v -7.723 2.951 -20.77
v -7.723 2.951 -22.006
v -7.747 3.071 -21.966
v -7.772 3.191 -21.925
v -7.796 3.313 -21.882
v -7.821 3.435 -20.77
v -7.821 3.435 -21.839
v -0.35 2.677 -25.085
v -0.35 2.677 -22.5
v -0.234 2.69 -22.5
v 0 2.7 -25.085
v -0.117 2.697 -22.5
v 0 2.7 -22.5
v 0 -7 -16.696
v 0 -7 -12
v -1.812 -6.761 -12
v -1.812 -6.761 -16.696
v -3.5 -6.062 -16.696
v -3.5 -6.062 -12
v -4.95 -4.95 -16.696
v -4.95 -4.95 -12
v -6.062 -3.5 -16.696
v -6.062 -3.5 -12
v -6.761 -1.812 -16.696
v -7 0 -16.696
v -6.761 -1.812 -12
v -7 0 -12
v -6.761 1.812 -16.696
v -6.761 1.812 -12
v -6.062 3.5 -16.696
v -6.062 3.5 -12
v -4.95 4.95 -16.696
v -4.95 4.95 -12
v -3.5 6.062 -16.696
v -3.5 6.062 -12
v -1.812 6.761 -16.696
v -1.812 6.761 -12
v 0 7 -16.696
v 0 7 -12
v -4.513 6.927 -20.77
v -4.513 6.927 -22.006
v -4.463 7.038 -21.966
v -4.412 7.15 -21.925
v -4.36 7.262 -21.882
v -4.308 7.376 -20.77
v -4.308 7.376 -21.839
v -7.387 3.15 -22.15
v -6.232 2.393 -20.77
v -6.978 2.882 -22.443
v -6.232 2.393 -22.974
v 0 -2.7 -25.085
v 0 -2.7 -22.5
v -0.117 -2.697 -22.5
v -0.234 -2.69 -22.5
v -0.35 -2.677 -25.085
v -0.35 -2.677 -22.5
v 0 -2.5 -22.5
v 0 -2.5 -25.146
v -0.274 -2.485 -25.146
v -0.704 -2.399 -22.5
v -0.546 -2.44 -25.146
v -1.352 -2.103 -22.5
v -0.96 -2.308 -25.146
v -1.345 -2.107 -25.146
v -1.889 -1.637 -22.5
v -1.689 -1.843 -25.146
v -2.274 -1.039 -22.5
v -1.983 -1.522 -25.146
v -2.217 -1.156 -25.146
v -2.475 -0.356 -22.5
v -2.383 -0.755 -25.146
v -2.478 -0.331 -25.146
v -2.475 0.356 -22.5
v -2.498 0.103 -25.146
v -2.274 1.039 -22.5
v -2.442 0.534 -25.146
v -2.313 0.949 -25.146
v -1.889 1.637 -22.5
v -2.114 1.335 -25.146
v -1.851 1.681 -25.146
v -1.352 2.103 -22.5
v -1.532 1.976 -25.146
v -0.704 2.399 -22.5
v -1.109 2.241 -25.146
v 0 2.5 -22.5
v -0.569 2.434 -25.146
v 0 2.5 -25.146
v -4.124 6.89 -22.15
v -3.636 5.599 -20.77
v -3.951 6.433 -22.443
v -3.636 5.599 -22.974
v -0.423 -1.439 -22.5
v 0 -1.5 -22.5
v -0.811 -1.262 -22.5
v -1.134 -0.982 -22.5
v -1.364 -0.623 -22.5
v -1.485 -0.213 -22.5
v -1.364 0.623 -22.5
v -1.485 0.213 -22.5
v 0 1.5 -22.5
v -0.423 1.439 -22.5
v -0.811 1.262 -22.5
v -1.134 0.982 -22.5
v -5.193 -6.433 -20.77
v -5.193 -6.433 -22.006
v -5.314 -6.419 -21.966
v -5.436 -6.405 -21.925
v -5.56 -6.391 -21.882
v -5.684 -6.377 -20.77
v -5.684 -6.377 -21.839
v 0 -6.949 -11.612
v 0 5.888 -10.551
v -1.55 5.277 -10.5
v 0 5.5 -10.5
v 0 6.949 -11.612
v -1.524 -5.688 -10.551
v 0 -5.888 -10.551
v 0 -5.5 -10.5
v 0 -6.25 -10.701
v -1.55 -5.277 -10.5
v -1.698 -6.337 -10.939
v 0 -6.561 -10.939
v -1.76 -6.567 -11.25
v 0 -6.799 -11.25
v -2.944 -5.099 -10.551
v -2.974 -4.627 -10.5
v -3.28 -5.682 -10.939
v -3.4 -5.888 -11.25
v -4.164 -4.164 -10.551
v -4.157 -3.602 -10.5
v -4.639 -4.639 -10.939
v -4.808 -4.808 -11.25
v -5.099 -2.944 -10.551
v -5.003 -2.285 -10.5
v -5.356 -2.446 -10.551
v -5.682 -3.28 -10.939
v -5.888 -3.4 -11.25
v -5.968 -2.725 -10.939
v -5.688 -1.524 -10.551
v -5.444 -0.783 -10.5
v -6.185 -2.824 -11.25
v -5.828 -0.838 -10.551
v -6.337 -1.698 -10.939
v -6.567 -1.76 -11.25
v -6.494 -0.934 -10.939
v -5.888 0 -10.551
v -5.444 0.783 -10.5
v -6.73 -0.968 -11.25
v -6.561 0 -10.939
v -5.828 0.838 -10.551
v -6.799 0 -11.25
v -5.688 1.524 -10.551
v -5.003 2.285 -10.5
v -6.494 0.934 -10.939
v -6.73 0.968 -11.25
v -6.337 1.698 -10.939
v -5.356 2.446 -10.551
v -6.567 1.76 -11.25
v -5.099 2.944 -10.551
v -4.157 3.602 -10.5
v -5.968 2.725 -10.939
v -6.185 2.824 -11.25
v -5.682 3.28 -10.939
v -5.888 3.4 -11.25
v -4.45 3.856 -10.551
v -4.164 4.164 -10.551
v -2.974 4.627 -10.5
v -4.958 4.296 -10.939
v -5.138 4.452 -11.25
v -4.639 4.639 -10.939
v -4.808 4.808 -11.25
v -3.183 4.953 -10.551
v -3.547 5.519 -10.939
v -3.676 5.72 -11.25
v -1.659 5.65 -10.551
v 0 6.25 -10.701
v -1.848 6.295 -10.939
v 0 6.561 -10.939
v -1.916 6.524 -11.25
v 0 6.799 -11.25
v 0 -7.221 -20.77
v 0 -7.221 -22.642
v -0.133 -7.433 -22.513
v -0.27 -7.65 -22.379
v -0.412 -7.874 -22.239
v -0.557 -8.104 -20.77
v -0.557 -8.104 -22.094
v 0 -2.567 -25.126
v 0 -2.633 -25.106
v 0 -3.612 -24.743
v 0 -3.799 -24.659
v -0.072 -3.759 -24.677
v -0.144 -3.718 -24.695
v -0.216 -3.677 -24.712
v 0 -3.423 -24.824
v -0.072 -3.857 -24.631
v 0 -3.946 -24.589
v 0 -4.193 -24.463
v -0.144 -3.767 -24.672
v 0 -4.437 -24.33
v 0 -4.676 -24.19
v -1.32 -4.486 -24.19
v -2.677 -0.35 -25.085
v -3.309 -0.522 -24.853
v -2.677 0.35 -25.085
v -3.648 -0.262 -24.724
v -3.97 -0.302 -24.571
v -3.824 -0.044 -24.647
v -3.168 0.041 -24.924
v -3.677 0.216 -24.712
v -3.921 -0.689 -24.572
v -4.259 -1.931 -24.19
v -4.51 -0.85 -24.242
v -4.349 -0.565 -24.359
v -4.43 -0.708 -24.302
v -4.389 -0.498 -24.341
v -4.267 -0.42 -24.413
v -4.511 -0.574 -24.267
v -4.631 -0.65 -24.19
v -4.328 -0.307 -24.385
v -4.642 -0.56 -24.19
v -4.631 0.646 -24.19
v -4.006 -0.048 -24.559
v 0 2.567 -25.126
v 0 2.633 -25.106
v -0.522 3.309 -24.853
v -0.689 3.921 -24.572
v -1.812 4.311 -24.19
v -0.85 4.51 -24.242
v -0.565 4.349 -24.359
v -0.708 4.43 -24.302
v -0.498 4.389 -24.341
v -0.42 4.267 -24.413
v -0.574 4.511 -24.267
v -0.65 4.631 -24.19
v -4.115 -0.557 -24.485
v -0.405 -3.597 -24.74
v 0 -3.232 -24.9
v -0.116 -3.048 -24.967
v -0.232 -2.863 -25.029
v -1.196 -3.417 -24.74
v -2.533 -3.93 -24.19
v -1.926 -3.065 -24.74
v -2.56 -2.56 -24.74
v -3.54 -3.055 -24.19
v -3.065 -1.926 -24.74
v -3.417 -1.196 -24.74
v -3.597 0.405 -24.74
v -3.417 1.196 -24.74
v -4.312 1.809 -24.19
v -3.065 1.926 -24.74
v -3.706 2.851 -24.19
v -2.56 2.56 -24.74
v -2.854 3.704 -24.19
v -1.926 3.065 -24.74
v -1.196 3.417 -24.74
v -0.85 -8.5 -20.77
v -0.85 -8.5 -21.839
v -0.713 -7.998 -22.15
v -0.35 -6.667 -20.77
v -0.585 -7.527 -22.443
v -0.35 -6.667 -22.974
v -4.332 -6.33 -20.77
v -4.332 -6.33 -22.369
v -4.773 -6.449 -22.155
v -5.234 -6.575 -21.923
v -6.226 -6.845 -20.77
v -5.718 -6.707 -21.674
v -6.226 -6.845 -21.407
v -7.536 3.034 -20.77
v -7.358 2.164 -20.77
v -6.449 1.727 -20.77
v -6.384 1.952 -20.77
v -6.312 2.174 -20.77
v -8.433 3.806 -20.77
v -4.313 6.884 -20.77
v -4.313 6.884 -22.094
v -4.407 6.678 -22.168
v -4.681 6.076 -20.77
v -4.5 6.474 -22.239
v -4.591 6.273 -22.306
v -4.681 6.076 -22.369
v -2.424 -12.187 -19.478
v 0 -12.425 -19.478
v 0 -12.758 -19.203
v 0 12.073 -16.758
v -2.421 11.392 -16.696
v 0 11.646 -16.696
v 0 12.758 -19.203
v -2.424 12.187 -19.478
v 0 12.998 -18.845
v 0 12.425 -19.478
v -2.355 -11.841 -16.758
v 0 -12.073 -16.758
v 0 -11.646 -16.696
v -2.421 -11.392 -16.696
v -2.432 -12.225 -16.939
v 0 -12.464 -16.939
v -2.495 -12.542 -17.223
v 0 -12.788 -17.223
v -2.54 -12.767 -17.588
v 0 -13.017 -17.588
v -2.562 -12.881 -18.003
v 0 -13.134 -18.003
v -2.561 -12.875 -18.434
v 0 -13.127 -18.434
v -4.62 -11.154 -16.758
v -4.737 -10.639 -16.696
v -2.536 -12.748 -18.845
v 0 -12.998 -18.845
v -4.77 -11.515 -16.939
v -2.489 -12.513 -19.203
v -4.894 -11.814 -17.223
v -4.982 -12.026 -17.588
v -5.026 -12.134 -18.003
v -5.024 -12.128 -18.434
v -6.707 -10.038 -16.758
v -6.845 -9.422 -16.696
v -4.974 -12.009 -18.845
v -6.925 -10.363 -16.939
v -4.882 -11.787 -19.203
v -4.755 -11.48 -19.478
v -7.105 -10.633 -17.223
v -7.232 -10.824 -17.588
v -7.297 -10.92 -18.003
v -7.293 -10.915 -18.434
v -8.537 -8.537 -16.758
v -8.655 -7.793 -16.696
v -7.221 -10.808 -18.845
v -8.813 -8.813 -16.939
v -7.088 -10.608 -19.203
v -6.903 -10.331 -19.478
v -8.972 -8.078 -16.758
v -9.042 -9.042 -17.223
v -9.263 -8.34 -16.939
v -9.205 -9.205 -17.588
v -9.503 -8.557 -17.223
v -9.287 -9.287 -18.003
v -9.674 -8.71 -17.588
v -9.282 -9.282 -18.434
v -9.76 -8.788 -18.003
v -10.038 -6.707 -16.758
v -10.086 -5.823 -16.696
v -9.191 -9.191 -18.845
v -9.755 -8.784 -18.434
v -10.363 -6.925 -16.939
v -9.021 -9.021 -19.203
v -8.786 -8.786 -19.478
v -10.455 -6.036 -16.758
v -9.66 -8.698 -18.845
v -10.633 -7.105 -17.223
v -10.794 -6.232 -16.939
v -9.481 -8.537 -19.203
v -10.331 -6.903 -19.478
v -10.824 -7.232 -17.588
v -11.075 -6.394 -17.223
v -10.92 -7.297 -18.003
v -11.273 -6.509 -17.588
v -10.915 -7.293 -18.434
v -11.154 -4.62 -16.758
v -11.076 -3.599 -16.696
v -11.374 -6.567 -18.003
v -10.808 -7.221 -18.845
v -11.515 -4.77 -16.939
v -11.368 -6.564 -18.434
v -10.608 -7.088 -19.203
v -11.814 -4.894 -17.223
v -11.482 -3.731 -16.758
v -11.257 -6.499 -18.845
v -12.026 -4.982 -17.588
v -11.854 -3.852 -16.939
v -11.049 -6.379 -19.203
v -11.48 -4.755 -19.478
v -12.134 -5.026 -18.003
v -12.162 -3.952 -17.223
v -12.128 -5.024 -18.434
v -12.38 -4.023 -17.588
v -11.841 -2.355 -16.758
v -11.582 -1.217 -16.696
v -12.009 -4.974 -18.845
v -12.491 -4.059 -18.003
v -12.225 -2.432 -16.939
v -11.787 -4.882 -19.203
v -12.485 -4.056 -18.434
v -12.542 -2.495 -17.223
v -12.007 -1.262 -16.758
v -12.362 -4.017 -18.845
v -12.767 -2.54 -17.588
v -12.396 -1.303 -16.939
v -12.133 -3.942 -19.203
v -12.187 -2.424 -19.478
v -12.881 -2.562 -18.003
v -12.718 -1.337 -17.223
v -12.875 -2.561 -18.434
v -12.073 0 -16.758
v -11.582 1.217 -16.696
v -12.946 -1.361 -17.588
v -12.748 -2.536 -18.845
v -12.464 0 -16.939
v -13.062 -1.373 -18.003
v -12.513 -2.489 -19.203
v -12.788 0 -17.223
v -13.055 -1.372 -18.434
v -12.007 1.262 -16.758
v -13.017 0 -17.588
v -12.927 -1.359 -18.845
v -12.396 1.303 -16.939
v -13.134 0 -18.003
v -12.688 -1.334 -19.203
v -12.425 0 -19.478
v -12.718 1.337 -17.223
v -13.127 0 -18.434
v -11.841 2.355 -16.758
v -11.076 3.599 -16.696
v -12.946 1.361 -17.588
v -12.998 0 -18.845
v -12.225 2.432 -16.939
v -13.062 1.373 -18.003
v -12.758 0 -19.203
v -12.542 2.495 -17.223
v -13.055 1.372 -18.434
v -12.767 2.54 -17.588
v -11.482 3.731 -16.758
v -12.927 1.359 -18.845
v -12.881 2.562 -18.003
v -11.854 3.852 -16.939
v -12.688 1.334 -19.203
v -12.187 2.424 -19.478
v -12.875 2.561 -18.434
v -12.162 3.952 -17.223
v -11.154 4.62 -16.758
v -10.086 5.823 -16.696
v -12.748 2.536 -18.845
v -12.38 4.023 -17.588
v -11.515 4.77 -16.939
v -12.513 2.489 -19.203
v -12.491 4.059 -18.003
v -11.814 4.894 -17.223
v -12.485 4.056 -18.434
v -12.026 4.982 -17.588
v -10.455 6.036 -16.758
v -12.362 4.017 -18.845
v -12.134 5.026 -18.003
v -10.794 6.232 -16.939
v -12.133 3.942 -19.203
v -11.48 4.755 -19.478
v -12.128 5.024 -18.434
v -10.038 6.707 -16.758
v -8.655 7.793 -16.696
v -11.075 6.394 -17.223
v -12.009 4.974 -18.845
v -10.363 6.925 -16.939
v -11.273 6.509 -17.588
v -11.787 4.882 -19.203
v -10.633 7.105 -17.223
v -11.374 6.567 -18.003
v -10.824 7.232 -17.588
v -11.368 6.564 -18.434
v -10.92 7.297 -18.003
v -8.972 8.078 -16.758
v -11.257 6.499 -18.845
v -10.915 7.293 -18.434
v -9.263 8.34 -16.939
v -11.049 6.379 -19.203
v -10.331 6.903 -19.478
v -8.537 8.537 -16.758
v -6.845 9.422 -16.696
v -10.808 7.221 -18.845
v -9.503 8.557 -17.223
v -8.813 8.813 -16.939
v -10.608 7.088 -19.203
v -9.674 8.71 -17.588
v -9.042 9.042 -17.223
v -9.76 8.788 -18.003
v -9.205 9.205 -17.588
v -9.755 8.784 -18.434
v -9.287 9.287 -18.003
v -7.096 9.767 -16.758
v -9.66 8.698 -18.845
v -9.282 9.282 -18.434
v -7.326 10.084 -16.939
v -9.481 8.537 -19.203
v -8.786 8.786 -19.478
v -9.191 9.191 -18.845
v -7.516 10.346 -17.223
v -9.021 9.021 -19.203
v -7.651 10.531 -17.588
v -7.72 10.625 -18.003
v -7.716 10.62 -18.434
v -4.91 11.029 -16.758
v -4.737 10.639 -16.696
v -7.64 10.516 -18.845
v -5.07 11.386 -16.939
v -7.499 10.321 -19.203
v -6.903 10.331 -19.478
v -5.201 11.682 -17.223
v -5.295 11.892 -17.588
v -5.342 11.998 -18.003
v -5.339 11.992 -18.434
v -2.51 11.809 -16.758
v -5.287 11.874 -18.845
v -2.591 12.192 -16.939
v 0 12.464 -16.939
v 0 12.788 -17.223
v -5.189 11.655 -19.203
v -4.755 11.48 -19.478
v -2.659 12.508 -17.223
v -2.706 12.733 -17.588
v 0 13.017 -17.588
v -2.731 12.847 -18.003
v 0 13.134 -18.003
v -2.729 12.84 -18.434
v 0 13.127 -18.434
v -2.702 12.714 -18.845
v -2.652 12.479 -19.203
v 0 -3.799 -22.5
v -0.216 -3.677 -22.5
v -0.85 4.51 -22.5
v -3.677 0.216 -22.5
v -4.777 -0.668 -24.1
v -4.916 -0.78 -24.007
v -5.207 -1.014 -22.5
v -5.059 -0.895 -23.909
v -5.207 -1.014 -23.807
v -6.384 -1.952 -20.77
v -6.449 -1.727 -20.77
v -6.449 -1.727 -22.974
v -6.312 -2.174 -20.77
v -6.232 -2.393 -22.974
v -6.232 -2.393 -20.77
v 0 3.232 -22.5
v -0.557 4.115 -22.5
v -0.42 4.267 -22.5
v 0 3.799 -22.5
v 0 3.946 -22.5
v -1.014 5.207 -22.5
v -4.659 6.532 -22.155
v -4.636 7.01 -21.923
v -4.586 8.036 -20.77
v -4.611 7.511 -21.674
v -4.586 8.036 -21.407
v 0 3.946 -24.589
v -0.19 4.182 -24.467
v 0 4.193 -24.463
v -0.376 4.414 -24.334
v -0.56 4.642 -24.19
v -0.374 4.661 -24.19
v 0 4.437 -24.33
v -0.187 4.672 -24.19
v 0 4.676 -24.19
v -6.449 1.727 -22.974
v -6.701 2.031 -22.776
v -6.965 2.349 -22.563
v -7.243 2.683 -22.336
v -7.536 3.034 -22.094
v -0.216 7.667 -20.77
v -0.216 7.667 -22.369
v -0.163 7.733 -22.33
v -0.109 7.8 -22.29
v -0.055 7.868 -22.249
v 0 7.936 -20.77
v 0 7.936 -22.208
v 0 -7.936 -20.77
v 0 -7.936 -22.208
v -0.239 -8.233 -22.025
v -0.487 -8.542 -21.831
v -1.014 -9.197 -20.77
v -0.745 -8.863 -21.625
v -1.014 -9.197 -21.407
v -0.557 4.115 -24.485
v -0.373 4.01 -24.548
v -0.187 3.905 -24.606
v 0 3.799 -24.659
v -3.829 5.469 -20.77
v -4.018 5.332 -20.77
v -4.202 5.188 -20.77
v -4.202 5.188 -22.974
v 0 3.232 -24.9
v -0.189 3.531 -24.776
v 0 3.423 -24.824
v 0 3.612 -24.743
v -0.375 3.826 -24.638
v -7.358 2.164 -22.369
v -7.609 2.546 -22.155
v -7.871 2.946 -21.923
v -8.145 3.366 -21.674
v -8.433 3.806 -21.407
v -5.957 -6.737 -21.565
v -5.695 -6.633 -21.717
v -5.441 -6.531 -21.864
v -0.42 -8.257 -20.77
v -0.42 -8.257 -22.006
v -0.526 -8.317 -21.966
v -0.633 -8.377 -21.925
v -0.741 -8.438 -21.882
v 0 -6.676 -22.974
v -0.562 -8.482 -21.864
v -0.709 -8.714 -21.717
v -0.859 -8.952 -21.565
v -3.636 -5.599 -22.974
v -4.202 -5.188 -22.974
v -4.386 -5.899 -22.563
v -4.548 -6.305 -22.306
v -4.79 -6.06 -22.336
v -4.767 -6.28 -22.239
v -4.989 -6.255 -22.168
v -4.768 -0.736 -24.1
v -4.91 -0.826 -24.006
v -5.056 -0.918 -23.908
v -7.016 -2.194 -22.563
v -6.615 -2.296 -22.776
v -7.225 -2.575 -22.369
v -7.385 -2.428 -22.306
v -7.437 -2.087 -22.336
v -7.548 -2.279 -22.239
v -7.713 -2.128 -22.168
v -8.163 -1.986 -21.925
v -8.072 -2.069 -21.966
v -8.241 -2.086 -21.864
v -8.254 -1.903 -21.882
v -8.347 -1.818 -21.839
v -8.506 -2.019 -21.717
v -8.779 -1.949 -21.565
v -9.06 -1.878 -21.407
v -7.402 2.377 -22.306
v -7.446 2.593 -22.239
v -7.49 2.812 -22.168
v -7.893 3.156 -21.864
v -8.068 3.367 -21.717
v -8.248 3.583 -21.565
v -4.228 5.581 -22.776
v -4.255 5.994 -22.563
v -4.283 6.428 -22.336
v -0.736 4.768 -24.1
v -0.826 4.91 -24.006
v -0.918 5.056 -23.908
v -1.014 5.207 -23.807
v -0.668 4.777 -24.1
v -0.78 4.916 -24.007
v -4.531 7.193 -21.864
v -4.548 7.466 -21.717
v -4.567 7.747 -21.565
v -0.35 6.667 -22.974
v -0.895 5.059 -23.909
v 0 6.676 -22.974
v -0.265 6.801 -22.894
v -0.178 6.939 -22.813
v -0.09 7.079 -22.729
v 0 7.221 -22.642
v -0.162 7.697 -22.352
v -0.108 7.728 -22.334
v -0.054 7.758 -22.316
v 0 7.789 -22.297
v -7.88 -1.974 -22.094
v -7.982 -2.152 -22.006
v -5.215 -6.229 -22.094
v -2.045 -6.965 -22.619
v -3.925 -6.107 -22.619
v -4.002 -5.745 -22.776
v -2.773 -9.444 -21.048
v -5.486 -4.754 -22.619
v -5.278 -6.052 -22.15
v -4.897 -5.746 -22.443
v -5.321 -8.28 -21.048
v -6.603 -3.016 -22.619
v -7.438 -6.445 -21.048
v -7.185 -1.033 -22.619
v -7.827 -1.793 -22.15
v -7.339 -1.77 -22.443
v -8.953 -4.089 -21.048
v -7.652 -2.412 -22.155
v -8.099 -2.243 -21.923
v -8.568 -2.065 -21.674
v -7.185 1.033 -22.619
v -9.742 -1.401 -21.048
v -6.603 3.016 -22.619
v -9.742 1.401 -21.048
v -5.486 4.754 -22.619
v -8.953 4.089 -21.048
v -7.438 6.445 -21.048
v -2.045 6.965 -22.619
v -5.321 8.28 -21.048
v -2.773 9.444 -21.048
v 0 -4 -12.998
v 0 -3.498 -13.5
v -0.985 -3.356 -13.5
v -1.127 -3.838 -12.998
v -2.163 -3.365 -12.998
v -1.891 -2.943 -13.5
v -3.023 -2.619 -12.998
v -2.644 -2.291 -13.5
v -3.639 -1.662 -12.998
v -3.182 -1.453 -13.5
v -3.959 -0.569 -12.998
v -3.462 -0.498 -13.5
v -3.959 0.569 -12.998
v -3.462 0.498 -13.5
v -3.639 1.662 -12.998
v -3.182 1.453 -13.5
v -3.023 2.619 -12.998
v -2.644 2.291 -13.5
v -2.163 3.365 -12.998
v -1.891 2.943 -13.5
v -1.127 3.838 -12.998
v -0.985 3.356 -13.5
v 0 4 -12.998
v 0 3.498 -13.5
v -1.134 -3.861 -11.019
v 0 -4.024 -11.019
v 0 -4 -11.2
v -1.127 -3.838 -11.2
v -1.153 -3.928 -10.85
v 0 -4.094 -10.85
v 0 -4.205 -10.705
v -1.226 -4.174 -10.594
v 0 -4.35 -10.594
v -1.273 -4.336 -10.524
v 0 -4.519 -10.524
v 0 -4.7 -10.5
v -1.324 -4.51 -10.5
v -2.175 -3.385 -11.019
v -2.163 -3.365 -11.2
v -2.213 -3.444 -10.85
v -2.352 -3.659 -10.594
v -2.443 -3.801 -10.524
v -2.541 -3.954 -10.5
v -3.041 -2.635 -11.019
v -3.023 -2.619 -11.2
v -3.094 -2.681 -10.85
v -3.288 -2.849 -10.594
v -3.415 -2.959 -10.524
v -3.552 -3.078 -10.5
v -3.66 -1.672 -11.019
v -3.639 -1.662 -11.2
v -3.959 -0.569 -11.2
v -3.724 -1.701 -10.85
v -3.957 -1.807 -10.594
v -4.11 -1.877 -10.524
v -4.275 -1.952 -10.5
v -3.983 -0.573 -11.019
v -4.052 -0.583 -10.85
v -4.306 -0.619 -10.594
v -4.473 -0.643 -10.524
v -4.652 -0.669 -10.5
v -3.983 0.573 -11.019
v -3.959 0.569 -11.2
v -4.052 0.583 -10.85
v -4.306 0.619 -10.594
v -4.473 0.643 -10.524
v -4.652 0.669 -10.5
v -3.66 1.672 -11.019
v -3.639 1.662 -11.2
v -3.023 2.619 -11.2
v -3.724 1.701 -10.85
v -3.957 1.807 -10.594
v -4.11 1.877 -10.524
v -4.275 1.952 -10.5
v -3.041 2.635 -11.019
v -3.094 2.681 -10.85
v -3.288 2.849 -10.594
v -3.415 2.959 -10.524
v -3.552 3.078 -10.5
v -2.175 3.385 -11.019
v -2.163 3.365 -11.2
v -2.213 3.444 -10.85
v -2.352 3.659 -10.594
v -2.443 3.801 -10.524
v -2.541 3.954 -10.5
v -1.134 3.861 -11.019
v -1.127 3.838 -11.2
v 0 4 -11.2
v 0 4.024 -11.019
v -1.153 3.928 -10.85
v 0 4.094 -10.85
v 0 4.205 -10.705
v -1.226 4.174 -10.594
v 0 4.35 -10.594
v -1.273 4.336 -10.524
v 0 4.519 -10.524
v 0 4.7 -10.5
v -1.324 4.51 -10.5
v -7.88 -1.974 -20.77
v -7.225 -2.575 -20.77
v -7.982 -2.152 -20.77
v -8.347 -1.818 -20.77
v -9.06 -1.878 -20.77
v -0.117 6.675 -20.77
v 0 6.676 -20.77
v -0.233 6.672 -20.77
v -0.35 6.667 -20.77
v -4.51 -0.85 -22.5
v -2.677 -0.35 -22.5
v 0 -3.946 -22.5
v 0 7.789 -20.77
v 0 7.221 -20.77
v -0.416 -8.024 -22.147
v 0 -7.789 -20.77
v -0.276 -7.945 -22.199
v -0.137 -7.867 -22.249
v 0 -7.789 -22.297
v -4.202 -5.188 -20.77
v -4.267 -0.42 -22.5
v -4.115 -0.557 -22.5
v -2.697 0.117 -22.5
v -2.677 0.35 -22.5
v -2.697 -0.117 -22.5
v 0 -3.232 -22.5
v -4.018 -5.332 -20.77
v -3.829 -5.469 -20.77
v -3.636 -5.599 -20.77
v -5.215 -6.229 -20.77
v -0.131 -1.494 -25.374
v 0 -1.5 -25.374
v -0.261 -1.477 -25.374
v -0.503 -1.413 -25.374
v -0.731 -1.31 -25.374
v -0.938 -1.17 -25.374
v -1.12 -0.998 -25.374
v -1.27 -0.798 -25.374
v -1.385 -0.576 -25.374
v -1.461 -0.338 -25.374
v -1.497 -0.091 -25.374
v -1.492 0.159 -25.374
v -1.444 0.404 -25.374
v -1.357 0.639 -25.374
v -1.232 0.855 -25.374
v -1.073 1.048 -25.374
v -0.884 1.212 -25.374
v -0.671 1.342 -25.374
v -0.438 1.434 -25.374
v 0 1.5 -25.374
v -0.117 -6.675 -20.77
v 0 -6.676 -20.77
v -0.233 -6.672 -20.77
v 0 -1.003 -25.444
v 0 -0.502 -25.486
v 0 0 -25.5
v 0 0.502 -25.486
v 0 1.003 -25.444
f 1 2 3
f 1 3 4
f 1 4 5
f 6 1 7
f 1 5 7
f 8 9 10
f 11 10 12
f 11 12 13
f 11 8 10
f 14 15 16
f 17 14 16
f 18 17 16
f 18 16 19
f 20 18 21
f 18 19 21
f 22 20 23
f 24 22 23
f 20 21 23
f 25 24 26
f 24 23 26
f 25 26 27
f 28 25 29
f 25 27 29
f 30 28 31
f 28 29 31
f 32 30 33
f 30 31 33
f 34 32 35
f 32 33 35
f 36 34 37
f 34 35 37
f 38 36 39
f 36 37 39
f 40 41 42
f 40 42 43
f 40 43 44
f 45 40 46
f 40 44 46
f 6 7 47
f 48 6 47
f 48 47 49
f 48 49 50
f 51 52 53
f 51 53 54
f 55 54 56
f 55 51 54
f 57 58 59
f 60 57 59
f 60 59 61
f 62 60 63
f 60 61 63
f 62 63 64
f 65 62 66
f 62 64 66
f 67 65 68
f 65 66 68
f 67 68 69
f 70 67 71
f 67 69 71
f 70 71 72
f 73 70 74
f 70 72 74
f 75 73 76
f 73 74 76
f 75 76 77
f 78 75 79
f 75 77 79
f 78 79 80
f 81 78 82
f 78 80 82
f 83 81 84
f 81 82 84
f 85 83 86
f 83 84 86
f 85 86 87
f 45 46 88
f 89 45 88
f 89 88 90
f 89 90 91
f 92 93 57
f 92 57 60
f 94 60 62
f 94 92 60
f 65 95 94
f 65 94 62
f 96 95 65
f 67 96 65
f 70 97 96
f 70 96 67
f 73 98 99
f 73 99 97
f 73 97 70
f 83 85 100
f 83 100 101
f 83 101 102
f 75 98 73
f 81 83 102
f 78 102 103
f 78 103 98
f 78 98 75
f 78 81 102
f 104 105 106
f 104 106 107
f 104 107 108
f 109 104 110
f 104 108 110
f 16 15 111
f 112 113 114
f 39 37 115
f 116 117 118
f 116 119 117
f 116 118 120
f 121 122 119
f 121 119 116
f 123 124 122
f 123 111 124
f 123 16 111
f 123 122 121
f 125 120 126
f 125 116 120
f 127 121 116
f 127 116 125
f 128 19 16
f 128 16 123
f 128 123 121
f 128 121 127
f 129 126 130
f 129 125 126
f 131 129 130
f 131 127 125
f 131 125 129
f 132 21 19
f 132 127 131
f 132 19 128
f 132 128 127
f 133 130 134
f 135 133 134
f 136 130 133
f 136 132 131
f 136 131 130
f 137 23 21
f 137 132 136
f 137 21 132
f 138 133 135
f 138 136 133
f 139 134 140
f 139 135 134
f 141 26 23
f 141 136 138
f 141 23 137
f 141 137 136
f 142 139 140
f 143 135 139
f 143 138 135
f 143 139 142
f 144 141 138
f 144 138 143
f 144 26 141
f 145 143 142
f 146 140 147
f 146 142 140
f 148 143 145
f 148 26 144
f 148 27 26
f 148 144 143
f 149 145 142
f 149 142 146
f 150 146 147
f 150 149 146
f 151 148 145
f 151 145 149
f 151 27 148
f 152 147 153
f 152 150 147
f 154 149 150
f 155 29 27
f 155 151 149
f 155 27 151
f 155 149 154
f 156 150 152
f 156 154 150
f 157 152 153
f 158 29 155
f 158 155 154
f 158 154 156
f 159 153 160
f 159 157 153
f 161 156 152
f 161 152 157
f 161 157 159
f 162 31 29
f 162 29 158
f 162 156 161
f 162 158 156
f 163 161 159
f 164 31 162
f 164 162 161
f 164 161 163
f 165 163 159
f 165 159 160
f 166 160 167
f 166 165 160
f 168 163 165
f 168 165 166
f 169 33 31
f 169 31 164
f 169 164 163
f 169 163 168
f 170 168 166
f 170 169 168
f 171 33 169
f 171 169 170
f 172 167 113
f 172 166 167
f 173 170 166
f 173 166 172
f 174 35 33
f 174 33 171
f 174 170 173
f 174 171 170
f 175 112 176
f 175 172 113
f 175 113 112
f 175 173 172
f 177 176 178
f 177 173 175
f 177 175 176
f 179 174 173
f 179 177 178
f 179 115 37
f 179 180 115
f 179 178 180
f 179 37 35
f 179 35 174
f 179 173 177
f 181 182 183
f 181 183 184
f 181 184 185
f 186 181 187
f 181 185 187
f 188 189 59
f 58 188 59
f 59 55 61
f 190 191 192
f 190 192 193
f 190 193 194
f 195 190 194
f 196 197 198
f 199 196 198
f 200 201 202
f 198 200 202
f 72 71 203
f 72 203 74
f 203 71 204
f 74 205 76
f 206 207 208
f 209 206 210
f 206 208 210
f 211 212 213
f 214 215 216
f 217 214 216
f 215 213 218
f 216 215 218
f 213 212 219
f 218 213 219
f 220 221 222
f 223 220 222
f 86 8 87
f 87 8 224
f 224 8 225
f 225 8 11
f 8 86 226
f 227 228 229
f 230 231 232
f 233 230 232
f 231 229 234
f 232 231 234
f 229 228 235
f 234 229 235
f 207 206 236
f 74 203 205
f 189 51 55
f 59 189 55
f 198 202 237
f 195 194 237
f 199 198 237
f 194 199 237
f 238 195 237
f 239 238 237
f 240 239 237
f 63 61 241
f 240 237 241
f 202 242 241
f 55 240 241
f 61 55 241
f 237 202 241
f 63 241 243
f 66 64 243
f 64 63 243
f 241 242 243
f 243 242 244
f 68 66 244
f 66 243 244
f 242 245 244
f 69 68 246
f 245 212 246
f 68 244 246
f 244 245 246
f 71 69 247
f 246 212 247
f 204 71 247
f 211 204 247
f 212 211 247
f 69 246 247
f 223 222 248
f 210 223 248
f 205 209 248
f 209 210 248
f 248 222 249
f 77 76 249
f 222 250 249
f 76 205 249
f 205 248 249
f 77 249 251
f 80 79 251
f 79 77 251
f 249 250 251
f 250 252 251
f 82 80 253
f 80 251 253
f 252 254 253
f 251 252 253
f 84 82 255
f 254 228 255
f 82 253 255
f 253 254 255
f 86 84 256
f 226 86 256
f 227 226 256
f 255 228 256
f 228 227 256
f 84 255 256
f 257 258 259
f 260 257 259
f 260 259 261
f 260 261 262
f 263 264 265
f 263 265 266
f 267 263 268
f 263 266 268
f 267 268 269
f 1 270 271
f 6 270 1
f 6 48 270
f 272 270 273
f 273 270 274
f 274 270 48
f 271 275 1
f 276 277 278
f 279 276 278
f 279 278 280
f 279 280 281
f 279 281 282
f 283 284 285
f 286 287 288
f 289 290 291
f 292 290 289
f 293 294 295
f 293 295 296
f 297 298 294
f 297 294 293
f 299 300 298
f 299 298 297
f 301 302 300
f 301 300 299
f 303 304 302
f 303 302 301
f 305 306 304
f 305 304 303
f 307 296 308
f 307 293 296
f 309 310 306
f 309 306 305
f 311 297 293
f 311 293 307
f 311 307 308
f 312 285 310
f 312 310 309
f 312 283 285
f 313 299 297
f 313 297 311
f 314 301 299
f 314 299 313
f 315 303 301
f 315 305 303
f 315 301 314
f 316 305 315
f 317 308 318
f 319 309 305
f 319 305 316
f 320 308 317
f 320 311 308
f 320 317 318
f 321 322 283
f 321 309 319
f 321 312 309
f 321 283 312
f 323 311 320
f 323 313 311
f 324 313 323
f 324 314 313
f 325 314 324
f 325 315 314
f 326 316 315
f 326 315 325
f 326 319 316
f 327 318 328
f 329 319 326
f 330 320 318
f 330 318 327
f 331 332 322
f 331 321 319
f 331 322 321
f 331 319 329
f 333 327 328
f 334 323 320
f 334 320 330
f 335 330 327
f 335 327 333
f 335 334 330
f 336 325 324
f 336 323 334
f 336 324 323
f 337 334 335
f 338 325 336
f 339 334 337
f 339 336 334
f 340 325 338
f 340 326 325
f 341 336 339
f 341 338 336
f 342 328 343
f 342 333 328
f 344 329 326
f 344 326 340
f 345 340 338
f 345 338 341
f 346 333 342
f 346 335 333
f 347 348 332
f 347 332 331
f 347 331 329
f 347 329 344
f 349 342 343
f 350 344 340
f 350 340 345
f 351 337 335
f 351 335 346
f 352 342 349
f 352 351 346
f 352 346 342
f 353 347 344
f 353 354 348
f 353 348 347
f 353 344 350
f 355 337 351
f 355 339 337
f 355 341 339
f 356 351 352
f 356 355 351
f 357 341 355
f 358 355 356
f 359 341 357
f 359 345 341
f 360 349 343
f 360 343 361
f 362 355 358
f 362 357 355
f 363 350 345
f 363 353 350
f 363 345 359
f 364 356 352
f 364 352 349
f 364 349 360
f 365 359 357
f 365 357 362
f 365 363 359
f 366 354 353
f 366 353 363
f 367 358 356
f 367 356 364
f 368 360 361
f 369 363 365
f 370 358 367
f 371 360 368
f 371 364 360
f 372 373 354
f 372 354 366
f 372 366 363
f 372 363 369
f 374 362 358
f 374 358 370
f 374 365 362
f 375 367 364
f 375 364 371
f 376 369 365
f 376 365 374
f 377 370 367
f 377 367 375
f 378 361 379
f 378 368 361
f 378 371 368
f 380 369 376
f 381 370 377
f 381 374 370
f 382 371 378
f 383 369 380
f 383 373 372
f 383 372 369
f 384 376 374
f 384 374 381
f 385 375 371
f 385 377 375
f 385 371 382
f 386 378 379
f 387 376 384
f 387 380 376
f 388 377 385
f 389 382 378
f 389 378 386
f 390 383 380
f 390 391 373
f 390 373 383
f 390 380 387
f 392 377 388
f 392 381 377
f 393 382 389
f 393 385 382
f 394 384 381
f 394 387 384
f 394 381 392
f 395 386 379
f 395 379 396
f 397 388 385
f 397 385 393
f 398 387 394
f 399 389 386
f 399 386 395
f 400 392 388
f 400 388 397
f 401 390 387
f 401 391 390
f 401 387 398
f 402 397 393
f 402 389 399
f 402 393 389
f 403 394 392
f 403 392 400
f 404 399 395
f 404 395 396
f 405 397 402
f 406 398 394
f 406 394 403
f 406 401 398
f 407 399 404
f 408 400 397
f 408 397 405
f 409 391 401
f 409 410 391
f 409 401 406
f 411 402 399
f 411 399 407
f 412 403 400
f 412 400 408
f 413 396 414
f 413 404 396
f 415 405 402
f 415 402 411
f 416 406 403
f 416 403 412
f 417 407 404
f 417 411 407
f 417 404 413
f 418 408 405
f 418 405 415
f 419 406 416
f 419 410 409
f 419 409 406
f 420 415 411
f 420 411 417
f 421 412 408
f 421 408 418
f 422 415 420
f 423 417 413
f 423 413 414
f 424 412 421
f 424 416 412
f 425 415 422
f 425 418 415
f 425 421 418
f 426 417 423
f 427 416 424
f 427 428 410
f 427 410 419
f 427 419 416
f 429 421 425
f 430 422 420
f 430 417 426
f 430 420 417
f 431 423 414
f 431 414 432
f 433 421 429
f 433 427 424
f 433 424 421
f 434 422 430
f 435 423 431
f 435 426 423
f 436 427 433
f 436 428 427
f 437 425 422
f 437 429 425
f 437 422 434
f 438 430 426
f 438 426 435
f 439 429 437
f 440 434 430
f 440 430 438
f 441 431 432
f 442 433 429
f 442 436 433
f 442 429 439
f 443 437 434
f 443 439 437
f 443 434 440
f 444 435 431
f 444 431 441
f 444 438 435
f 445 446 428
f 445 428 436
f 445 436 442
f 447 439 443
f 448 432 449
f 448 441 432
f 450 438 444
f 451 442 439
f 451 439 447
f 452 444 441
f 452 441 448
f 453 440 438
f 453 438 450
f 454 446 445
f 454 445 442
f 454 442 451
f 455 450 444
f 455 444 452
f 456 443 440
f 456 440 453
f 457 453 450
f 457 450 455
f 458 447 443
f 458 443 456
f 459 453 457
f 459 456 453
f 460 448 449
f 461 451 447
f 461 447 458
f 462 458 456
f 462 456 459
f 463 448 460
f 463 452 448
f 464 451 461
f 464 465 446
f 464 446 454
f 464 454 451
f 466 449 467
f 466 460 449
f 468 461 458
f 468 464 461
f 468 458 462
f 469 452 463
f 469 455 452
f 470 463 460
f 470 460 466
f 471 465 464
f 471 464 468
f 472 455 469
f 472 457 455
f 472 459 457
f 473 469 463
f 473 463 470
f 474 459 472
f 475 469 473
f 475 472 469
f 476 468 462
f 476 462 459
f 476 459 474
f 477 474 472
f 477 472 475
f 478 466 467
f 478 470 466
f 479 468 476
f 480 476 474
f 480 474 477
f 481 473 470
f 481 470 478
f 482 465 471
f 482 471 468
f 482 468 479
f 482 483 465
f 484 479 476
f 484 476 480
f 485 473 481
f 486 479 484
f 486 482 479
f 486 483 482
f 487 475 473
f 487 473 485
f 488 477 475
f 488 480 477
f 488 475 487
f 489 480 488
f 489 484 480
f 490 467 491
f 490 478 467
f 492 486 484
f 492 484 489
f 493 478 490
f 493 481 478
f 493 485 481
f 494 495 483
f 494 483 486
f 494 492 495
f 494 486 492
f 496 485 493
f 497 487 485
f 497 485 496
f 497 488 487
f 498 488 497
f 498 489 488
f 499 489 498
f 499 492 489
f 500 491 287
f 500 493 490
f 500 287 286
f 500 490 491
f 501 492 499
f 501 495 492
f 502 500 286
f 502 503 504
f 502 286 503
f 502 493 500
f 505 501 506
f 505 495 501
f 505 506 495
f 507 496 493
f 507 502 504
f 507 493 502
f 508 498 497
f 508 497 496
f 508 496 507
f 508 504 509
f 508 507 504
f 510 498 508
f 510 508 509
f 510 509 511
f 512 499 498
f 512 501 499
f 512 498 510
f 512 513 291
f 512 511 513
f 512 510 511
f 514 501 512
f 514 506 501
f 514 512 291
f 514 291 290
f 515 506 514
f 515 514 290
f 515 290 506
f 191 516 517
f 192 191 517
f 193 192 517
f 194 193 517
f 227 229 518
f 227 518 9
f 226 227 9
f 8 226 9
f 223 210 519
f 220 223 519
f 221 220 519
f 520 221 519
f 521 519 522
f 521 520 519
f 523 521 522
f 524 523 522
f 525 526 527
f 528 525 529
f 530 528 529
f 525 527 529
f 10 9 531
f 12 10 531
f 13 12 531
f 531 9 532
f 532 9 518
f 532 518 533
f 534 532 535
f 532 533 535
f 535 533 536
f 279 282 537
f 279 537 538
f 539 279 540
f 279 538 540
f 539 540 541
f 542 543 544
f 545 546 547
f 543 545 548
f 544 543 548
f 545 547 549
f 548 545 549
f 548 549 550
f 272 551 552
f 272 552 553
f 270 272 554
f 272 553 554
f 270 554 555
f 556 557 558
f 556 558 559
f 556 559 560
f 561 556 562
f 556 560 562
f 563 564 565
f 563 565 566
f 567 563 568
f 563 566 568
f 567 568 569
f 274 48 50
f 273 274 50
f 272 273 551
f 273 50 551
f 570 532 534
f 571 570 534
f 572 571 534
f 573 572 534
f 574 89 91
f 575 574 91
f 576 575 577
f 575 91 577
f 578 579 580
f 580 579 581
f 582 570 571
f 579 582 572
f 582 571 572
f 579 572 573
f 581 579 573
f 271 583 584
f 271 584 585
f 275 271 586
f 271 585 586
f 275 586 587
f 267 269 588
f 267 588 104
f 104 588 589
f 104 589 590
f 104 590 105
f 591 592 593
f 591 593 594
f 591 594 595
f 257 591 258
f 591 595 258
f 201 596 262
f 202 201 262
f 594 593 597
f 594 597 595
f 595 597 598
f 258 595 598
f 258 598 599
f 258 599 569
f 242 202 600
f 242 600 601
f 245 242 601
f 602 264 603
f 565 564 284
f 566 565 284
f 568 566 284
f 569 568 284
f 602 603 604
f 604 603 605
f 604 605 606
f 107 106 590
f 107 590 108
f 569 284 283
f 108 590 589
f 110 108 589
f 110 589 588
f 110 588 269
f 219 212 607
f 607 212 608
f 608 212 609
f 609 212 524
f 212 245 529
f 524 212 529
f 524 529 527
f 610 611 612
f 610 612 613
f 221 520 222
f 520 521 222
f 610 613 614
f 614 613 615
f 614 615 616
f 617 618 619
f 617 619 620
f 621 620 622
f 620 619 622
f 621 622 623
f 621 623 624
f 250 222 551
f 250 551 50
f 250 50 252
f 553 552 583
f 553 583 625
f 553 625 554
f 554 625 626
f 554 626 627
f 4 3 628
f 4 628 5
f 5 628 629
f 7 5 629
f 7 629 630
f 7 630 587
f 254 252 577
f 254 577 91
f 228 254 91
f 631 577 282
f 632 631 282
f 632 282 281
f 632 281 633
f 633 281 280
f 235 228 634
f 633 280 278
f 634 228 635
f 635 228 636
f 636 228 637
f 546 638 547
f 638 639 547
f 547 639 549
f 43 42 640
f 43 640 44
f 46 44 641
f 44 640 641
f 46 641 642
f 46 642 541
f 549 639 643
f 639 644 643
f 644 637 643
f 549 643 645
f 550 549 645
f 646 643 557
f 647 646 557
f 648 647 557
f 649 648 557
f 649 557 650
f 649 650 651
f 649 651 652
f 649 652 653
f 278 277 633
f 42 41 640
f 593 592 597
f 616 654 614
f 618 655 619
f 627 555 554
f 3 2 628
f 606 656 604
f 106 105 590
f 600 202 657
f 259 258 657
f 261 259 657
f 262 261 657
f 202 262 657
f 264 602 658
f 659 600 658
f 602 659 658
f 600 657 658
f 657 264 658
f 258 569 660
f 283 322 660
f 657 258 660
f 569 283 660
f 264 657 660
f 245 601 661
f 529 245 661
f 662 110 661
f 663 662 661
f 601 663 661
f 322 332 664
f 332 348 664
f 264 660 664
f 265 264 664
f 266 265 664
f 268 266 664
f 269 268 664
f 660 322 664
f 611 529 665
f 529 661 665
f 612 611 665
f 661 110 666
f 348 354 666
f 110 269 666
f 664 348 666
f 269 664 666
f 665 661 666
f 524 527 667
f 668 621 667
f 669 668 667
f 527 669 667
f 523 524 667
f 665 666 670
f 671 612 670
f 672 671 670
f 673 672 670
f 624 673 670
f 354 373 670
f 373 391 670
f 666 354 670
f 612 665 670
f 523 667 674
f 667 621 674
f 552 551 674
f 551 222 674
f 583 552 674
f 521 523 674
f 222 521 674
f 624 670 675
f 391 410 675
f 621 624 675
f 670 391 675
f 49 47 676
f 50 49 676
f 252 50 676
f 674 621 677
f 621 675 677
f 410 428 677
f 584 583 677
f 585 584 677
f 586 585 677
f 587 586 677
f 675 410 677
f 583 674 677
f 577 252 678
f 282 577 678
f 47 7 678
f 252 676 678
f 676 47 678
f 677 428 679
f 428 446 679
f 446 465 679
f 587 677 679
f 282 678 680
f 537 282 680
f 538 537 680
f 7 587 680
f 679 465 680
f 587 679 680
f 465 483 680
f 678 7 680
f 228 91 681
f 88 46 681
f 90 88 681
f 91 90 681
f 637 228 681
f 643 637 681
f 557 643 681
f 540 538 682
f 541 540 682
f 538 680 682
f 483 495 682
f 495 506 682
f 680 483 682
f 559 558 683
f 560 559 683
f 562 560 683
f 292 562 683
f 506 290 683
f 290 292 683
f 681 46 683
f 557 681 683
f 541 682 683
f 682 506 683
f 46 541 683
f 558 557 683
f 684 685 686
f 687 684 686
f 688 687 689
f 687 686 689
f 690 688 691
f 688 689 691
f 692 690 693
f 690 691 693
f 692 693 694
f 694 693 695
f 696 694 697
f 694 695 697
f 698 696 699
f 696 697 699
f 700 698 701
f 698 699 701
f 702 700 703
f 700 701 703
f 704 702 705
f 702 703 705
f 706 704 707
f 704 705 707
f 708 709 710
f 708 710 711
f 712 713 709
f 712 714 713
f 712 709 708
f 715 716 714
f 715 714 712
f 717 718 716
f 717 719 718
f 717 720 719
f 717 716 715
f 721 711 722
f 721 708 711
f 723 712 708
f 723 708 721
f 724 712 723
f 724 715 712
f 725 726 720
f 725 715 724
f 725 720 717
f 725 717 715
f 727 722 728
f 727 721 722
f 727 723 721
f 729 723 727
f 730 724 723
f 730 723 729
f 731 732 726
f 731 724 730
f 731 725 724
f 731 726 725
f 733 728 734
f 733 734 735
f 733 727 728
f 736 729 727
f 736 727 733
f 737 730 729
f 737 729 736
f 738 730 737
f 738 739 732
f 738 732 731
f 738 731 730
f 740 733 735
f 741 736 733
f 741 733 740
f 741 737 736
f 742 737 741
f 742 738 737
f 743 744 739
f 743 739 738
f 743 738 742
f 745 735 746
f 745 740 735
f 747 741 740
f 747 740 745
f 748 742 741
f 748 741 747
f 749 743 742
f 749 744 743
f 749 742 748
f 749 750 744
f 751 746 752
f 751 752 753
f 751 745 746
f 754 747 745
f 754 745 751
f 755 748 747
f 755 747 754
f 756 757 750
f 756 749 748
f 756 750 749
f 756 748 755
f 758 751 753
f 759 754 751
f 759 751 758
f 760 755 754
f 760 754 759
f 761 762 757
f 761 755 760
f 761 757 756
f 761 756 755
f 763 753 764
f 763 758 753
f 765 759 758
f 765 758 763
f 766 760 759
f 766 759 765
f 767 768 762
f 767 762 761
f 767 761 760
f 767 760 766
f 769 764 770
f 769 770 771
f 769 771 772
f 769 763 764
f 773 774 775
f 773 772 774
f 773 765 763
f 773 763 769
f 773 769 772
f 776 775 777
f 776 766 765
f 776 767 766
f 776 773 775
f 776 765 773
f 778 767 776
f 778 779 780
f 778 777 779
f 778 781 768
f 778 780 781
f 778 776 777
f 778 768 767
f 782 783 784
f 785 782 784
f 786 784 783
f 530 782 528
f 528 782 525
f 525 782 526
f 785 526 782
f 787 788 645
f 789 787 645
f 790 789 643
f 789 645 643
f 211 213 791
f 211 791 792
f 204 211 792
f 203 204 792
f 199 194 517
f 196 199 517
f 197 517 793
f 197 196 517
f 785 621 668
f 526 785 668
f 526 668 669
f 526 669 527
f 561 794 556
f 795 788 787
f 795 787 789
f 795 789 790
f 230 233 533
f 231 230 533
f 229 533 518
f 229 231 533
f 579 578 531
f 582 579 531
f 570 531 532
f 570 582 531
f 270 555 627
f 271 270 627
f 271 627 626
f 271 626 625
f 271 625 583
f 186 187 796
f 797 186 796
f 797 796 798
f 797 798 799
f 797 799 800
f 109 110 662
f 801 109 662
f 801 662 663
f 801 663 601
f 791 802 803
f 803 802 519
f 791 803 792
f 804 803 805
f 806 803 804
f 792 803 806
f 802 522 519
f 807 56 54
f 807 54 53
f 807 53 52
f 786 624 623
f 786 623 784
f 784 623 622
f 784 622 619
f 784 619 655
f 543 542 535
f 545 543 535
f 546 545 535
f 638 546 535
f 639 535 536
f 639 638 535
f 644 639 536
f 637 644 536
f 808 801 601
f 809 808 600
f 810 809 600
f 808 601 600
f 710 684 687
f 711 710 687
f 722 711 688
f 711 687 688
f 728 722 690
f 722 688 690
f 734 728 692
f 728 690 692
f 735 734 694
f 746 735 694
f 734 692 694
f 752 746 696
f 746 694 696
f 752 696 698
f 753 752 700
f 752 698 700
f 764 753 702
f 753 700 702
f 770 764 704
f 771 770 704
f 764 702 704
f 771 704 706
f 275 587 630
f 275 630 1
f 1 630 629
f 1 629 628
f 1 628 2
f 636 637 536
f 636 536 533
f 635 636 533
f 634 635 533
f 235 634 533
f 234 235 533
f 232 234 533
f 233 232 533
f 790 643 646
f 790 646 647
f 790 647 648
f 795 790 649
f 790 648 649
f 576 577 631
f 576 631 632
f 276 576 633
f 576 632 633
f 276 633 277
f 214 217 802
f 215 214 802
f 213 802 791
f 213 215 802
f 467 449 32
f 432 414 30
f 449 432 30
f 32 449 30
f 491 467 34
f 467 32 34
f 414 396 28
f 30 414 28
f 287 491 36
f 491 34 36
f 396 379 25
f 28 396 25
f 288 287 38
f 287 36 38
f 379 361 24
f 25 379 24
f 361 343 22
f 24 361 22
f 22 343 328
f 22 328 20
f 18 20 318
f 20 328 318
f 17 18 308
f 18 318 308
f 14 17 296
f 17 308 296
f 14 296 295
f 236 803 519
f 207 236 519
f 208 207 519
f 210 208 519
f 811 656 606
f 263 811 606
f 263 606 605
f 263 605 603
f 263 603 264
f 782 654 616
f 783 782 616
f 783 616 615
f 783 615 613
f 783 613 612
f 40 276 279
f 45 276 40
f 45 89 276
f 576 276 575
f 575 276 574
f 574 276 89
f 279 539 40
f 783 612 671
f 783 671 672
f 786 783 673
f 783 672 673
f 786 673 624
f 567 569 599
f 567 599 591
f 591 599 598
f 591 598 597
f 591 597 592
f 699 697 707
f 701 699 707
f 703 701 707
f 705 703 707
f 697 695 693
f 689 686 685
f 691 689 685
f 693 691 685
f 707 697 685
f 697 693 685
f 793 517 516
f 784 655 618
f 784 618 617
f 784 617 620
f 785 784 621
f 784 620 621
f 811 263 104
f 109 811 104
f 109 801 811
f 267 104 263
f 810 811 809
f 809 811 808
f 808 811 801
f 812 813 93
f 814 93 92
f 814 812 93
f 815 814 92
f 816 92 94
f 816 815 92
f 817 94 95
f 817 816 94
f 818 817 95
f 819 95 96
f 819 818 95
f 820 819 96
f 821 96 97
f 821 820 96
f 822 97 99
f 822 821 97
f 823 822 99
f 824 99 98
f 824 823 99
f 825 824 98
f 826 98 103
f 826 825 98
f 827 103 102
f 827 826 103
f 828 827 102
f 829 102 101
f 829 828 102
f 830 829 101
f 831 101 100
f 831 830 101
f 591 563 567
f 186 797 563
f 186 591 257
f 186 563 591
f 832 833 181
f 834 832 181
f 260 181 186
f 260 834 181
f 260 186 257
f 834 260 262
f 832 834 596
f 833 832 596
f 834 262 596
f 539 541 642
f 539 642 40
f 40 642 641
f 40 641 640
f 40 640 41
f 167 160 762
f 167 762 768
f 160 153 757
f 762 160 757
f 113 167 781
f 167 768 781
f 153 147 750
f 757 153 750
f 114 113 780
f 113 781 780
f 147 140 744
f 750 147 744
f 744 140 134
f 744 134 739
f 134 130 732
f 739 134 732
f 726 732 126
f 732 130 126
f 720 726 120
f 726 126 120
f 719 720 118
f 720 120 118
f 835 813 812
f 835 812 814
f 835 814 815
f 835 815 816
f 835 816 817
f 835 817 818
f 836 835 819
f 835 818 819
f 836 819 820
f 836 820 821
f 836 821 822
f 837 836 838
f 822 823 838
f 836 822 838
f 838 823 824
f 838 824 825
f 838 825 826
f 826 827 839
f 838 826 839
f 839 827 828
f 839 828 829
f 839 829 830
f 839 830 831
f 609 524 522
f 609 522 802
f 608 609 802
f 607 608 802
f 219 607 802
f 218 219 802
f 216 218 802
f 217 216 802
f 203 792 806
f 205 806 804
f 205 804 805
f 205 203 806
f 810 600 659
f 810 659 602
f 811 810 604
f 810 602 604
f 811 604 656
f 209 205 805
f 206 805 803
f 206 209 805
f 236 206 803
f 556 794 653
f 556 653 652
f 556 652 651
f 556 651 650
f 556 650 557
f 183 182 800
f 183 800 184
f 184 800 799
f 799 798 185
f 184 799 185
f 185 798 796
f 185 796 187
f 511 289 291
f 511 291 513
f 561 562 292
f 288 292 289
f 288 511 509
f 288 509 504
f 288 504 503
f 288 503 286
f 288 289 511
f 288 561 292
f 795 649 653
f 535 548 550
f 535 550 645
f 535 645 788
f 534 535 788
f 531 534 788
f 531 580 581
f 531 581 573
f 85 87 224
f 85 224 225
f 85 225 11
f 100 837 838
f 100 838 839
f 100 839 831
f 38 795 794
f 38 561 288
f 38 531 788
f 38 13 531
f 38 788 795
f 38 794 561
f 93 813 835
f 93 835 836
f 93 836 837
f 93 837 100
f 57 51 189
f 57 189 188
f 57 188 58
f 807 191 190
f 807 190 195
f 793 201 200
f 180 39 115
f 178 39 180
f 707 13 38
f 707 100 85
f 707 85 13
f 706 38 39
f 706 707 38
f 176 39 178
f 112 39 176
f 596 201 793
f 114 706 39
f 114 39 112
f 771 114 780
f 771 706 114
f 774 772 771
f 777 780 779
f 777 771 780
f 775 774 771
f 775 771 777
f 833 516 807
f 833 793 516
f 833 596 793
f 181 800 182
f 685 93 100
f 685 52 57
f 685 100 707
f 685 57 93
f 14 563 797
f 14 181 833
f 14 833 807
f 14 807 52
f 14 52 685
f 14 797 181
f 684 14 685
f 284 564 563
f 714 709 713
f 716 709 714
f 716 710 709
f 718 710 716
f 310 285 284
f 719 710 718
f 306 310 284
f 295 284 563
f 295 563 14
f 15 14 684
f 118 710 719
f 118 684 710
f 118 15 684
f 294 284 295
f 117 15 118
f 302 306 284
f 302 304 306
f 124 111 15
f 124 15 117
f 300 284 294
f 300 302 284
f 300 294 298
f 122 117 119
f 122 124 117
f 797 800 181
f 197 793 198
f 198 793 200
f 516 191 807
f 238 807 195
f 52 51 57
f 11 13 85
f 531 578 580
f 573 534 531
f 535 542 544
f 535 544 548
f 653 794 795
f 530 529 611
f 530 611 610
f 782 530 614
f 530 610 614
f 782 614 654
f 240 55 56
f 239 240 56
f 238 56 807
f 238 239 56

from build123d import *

# Parameters (mm, degrees)
REDONDEO3_R           = 0.7
REDONDEO5_R           = 1.5
CROQUIS2_R            = 2.5
CROQUIS2_R_2          = 1.5
CORTAR_EXTRUIR1_DEPTH = 3
CORTAR_EXTRUIR3_DEPTH = 3


# Read off the part's stored shape, not the designer's step: Sólido-Eliminar/Conservar 1
with BuildPart() as part:
    # Croquis1 → Revolución1 (revolve)
    with BuildSketch(Plane(origin=(0, 0, 0), x_dir=(0, 0, -1), z_dir=(1, 0, 0)), mode=Mode.PRIVATE) as revoluci_n1_sk:
        with BuildLine():
            Line((10.5, 4), (12.997954185, 4))
            Line((12.997954185, 4), (13.5, 3.497954185))
            Line((13.5, 3.497954185), (13.5, 0))
            Line((13.5, 0), (25.5, 0))
            ThreePointArc((25.5, 0), (25.166294504, 2.428032035), (24.189924541, 4.676009041))
            Line((24.189924541, 4.676009041), (16.696080767, 17))
            Line((16.696080767, 17), (16.696080767, 7))
            Line((16.696080767, 7), (10.5, 7))
            Line((10.5, 7), (10.5, 4))
        make_face()
    revolve(revoluci_n1_sk.sketch.rotate(Axis((0, 0, 43.421280629), (0, 0, -1)), 90), axis=Axis((0, 0, 43.421280629), (0, 0, -1)))

    # Redondeo3
    redondeo3_edges = [part.edges().sort_by_distance(p)[0] for p in [
        (-4, 0, -10.5),
    ]]
    fillet(redondeo3_edges, radius=REDONDEO3_R)

    # Redondeo5
    redondeo5_edges = [part.edges().sort_by_distance(p)[0] for p in [
        (-17, 0, -16.696080767),
        (-7, 0, -10.5),
    ]]
    fillet(redondeo5_edges, radius=REDONDEO5_R)

    # Croquis2 → Cortar-Extruir1 (cut)
    # profile 1 of 5: a face of its own
    with BuildSketch(Plane(origin=(0, 0, -25.5), x_dir=(-1, 0, 0), z_dir=(0, 0, -1))):
        Circle(CROQUIS2_R)
        Circle(CROQUIS2_R_2, mode=Mode.SUBTRACT)
    # profile 2 of 5: a face of its own
    with BuildSketch(Plane(origin=(0, 0, -25.5), x_dir=(-1, 0, 0), z_dir=(0, 0, -1))):
        with BuildLine():
            Line((-0.35, 2.677218706), (0.557333453, 4.114836877))
            Line((0.557333453, 4.114836877), (-0.216020438, 3.677218706))
            Line((-0.216020438, 3.677218706), (1.01365522, 5.207218706))
            Line((1.01365522, 5.207218706), (0.420313019, 4.267101787))
            Line((0.420313019, 4.267101787), (0.85, 4.510248984))
            Line((0.85, 4.510248984), (0.35, 2.677218706))
            ThreePointArc((0.35, 2.677218706), (0, 2.7), (-0.35, 2.677218706))
        make_face()
    # profile 3 of 5: a face of its own
    with BuildSketch(Plane(origin=(0, 0, -25.5), x_dir=(-1, 0, 0), z_dir=(0, 0, -1))):
        with BuildLine():
            Line((4.510248984, -0.85), (2.677218706, -0.35))
            ThreePointArc((2.677218706, -0.35), (2.7, 0), (2.677218706, 0.35))
            Line((2.677218706, 0.35), (4.114836877, -0.557333453))
            Line((4.114836877, -0.557333453), (3.677218706, 0.216020438))
            Line((3.677218706, 0.216020438), (5.207218706, -1.01365522))
            Line((5.207218706, -1.01365522), (4.267101787, -0.420313019))
            Line((4.267101787, -0.420313019), (4.510248984, -0.85))
        make_face()
    # profile 4 of 5: a face of its own
    with BuildSketch(Plane(origin=(0, 0, -25.5), x_dir=(-1, 0, 0), z_dir=(0, 0, -1))):
        with BuildLine():
            Line((-0.85, -4.510248984), (-0.35, -2.677218706))
            ThreePointArc((-0.35, -2.677218706), (0, -2.7), (0.35, -2.677218706))
            Line((0.35, -2.677218706), (-0.557333453, -4.114836877))
            Line((-0.557333453, -4.114836877), (0.216020438, -3.677218706))
            Line((0.216020438, -3.677218706), (-1.01365522, -5.207218706))
            Line((-1.01365522, -5.207218706), (-0.420313019, -4.267101787))
            Line((-0.420313019, -4.267101787), (-0.85, -4.510248984))
        make_face()
    # profile 5 of 5: a face of its own
    with BuildSketch(Plane(origin=(0, 0, -25.5), x_dir=(-1, 0, 0), z_dir=(0, 0, -1))):
        with BuildLine():
            Line((-4.510248984, 0.85), (-2.677218706, 0.35))
            ThreePointArc((-2.677218706, 0.35), (-2.7, 0), (-2.677218706, -0.35))
            Line((-2.677218706, -0.35), (-4.114836877, 0.557333453))
            Line((-4.114836877, 0.557333453), (-3.677218706, -0.216020438))
            Line((-3.677218706, -0.216020438), (-5.207218706, 1.01365522))
            Line((-5.207218706, 1.01365522), (-4.267101787, 0.420313019))
            Line((-4.267101787, 0.420313019), (-4.510248984, 0.85))
        make_face()
    extrude(amount=-CORTAR_EXTRUIR1_DEPTH, mode=Mode.SUBTRACT)

    # Croquis3 → Cortar-Extruir3 (cut)
    with BuildSketch(Plane.XY.offset(-23.77)):
        with BuildLine():
            Line((-0.35, 6.666828085), (0.557333453, 8.104446256))
            Line((0.557333453, 8.104446256), (-0.216020438, 7.666828085))
            Line((-0.216020438, 7.666828085), (1.01365522, 9.196828085))
            Line((1.01365522, 9.196828085), (0.420313019, 8.256711166))
            Line((0.420313019, 8.256711166), (0.85, 8.499858363))
            Line((0.85, 8.499858363), (0.35, 6.666828085))
            ThreePointArc((0.35, 6.666828085), (0, 6.676009041), (-0.35, 6.666828085))
        make_face()
        with BuildLine():
            Line((3.63550728, 5.599302058), (5.214566222, 6.229042367))
            Line((5.214566222, 6.229042367), (4.331684274, 6.329567842))
            Line((4.331684274, 6.329567842), (6.225824216, 6.844578626))
            Line((6.225824216, 6.844578626), (5.193213431, 6.432765857))
            Line((5.193213431, 6.432765857), (5.683755838, 6.376912401))
            Line((5.683755838, 6.376912401), (4.201819176, 5.187852381))
            ThreePointArc((4.201819176, 5.187852381), (3.924059658, 5.401004769), (3.63550728, 5.599302058))
        make_face()
        with BuildLine():
            Line((6.232374345, 2.393032958), (7.880011931, 1.974356011))
            Line((7.880011931, 1.974356011), (7.224832823, 2.574627817))
            Line((7.224832823, 2.574627817), (9.059939969, 1.87793277))
            Line((9.059939969, 1.87793277), (7.982482824, 2.151722632))
            Line((7.982482824, 2.151722632), (8.346510129, 1.818202645))
            Line((8.346510129, 1.818202645), (6.448686241, 1.727293396))
            ThreePointArc((6.448686241, 1.727293396), (6.349261901, 2.063000248), (6.232374345, 2.393032958))
        make_face()
        with BuildLine():
            Line((6.448686241, -1.727293396), (7.535560914, -3.034467235))
            Line((7.535560914, -3.034467235), (7.358340796, -2.163732526))
            Line((7.358340796, -2.163732526), (8.43346659, -3.806019575))
            Line((8.43346659, -3.806019575), (7.722715092, -2.951205504))
            Line((7.722715092, -2.951205504), (7.821181238, -3.434998723))
            Line((7.821181238, -3.434998723), (6.232374345, -2.393032958))
            ThreePointArc((6.232374345, -2.393032958), (6.349261901, -2.063000248), (6.448686241, -1.727293396))
        make_face()
        with BuildLine():
            Line((4.201819176, -5.187852381), (4.312781752, -6.884227135))
            Line((4.312781752, -6.884227135), (4.681212686, -6.075620586))
            Line((4.681212686, -6.075620586), (4.585695617, -8.036201804))
            Line((4.585695617, -8.036201804), (4.513132681, -6.926873445))
            Line((4.513132681, -6.926873445), (4.308426947, -7.37614733))
            Line((4.308426947, -7.37614733), (3.63550728, -5.599302058))
            ThreePointArc((3.63550728, -5.599302058), (3.924059658, -5.401004769), (4.201819176, -5.187852381))
        make_face()
        with BuildLine():
            Line((0.35, -6.666828085), (-0.557333453, -8.104446256))
            Line((-0.557333453, -8.104446256), (0.216020438, -7.666828085))
            Line((0.216020438, -7.666828085), (-1.01365522, -9.196828085))
            Line((-1.01365522, -9.196828085), (-0.420313019, -8.256711166))
            Line((-0.420313019, -8.256711166), (-0.85, -8.499858363))
            Line((-0.85, -8.499858363), (-0.35, -6.666828085))
            ThreePointArc((-0.35, -6.666828085), (0, -6.676009041), (0.35, -6.666828085))
        make_face()
        with BuildLine():
            Line((-3.63550728, -5.599302058), (-5.214566222, -6.229042367))
            Line((-5.214566222, -6.229042367), (-4.331684274, -6.329567842))
            Line((-4.331684274, -6.329567842), (-6.225824216, -6.844578626))
            Line((-6.225824216, -6.844578626), (-5.193213431, -6.432765857))
            Line((-5.193213431, -6.432765857), (-5.683755838, -6.376912401))
            Line((-5.683755838, -6.376912401), (-4.201819176, -5.187852381))
            ThreePointArc((-4.201819176, -5.187852381), (-3.924059658, -5.401004769), (-3.63550728, -5.599302058))
        make_face()
        with BuildLine():
            Line((-6.232374345, -2.393032958), (-7.880011931, -1.974356011))
            Line((-7.880011931, -1.974356011), (-7.224832823, -2.574627817))
            Line((-7.224832823, -2.574627817), (-9.059939969, -1.87793277))
            Line((-9.059939969, -1.87793277), (-7.982482824, -2.151722632))
            Line((-7.982482824, -2.151722632), (-8.346510129, -1.818202645))
            Line((-8.346510129, -1.818202645), (-6.448686241, -1.727293396))
            ThreePointArc((-6.448686241, -1.727293396), (-6.349261901, -2.063000248), (-6.232374345, -2.393032958))
        make_face()
        with BuildLine():
            Line((-6.448686241, 1.727293396), (-7.535560914, 3.034467235))
            Line((-7.535560914, 3.034467235), (-7.358340796, 2.163732526))
            Line((-7.358340796, 2.163732526), (-8.43346659, 3.806019575))
            Line((-8.43346659, 3.806019575), (-7.722715092, 2.951205504))
            Line((-7.722715092, 2.951205504), (-7.821181238, 3.434998723))
            Line((-7.821181238, 3.434998723), (-6.232374345, 2.393032958))
            ThreePointArc((-6.232374345, 2.393032958), (-6.349261901, 2.063000248), (-6.448686241, 1.727293396))
        make_face()
        with BuildLine():
            Line((-4.201819176, 5.187852381), (-4.312781752, 6.884227135))
            Line((-4.312781752, 6.884227135), (-4.681212686, 6.075620586))
            Line((-4.681212686, 6.075620586), (-4.585695617, 8.036201804))
            Line((-4.585695617, 8.036201804), (-4.513132681, 6.926873445))
            Line((-4.513132681, 6.926873445), (-4.308426947, 7.37614733))
            Line((-4.308426947, 7.37614733), (-3.63550728, 5.599302058))
            ThreePointArc((-3.63550728, 5.599302058), (-3.924059658, 5.401004769), (-4.201819176, 5.187852381))
        make_face()
    extrude(amount=CORTAR_EXTRUIR3_DEPTH, mode=Mode.SUBTRACT)


with BuildPart() as body_2:
    # Partir1: the piece on the far side of the plane
    add(part.part)
    split(bisect_by=Plane(origin=(0, 0, 0), x_dir=(0, 0, 1), z_dir=(1, 0, 0)), keep=Keep.BOTTOM)


with BuildPart() as part_1:
    add(part.part)

    # Partir1
    split(bisect_by=Plane(origin=(0, 0, 0), x_dir=(0, 0, 1), z_dir=(1, 0, 0)), keep=Keep.TOP)


solid = body_2.part
